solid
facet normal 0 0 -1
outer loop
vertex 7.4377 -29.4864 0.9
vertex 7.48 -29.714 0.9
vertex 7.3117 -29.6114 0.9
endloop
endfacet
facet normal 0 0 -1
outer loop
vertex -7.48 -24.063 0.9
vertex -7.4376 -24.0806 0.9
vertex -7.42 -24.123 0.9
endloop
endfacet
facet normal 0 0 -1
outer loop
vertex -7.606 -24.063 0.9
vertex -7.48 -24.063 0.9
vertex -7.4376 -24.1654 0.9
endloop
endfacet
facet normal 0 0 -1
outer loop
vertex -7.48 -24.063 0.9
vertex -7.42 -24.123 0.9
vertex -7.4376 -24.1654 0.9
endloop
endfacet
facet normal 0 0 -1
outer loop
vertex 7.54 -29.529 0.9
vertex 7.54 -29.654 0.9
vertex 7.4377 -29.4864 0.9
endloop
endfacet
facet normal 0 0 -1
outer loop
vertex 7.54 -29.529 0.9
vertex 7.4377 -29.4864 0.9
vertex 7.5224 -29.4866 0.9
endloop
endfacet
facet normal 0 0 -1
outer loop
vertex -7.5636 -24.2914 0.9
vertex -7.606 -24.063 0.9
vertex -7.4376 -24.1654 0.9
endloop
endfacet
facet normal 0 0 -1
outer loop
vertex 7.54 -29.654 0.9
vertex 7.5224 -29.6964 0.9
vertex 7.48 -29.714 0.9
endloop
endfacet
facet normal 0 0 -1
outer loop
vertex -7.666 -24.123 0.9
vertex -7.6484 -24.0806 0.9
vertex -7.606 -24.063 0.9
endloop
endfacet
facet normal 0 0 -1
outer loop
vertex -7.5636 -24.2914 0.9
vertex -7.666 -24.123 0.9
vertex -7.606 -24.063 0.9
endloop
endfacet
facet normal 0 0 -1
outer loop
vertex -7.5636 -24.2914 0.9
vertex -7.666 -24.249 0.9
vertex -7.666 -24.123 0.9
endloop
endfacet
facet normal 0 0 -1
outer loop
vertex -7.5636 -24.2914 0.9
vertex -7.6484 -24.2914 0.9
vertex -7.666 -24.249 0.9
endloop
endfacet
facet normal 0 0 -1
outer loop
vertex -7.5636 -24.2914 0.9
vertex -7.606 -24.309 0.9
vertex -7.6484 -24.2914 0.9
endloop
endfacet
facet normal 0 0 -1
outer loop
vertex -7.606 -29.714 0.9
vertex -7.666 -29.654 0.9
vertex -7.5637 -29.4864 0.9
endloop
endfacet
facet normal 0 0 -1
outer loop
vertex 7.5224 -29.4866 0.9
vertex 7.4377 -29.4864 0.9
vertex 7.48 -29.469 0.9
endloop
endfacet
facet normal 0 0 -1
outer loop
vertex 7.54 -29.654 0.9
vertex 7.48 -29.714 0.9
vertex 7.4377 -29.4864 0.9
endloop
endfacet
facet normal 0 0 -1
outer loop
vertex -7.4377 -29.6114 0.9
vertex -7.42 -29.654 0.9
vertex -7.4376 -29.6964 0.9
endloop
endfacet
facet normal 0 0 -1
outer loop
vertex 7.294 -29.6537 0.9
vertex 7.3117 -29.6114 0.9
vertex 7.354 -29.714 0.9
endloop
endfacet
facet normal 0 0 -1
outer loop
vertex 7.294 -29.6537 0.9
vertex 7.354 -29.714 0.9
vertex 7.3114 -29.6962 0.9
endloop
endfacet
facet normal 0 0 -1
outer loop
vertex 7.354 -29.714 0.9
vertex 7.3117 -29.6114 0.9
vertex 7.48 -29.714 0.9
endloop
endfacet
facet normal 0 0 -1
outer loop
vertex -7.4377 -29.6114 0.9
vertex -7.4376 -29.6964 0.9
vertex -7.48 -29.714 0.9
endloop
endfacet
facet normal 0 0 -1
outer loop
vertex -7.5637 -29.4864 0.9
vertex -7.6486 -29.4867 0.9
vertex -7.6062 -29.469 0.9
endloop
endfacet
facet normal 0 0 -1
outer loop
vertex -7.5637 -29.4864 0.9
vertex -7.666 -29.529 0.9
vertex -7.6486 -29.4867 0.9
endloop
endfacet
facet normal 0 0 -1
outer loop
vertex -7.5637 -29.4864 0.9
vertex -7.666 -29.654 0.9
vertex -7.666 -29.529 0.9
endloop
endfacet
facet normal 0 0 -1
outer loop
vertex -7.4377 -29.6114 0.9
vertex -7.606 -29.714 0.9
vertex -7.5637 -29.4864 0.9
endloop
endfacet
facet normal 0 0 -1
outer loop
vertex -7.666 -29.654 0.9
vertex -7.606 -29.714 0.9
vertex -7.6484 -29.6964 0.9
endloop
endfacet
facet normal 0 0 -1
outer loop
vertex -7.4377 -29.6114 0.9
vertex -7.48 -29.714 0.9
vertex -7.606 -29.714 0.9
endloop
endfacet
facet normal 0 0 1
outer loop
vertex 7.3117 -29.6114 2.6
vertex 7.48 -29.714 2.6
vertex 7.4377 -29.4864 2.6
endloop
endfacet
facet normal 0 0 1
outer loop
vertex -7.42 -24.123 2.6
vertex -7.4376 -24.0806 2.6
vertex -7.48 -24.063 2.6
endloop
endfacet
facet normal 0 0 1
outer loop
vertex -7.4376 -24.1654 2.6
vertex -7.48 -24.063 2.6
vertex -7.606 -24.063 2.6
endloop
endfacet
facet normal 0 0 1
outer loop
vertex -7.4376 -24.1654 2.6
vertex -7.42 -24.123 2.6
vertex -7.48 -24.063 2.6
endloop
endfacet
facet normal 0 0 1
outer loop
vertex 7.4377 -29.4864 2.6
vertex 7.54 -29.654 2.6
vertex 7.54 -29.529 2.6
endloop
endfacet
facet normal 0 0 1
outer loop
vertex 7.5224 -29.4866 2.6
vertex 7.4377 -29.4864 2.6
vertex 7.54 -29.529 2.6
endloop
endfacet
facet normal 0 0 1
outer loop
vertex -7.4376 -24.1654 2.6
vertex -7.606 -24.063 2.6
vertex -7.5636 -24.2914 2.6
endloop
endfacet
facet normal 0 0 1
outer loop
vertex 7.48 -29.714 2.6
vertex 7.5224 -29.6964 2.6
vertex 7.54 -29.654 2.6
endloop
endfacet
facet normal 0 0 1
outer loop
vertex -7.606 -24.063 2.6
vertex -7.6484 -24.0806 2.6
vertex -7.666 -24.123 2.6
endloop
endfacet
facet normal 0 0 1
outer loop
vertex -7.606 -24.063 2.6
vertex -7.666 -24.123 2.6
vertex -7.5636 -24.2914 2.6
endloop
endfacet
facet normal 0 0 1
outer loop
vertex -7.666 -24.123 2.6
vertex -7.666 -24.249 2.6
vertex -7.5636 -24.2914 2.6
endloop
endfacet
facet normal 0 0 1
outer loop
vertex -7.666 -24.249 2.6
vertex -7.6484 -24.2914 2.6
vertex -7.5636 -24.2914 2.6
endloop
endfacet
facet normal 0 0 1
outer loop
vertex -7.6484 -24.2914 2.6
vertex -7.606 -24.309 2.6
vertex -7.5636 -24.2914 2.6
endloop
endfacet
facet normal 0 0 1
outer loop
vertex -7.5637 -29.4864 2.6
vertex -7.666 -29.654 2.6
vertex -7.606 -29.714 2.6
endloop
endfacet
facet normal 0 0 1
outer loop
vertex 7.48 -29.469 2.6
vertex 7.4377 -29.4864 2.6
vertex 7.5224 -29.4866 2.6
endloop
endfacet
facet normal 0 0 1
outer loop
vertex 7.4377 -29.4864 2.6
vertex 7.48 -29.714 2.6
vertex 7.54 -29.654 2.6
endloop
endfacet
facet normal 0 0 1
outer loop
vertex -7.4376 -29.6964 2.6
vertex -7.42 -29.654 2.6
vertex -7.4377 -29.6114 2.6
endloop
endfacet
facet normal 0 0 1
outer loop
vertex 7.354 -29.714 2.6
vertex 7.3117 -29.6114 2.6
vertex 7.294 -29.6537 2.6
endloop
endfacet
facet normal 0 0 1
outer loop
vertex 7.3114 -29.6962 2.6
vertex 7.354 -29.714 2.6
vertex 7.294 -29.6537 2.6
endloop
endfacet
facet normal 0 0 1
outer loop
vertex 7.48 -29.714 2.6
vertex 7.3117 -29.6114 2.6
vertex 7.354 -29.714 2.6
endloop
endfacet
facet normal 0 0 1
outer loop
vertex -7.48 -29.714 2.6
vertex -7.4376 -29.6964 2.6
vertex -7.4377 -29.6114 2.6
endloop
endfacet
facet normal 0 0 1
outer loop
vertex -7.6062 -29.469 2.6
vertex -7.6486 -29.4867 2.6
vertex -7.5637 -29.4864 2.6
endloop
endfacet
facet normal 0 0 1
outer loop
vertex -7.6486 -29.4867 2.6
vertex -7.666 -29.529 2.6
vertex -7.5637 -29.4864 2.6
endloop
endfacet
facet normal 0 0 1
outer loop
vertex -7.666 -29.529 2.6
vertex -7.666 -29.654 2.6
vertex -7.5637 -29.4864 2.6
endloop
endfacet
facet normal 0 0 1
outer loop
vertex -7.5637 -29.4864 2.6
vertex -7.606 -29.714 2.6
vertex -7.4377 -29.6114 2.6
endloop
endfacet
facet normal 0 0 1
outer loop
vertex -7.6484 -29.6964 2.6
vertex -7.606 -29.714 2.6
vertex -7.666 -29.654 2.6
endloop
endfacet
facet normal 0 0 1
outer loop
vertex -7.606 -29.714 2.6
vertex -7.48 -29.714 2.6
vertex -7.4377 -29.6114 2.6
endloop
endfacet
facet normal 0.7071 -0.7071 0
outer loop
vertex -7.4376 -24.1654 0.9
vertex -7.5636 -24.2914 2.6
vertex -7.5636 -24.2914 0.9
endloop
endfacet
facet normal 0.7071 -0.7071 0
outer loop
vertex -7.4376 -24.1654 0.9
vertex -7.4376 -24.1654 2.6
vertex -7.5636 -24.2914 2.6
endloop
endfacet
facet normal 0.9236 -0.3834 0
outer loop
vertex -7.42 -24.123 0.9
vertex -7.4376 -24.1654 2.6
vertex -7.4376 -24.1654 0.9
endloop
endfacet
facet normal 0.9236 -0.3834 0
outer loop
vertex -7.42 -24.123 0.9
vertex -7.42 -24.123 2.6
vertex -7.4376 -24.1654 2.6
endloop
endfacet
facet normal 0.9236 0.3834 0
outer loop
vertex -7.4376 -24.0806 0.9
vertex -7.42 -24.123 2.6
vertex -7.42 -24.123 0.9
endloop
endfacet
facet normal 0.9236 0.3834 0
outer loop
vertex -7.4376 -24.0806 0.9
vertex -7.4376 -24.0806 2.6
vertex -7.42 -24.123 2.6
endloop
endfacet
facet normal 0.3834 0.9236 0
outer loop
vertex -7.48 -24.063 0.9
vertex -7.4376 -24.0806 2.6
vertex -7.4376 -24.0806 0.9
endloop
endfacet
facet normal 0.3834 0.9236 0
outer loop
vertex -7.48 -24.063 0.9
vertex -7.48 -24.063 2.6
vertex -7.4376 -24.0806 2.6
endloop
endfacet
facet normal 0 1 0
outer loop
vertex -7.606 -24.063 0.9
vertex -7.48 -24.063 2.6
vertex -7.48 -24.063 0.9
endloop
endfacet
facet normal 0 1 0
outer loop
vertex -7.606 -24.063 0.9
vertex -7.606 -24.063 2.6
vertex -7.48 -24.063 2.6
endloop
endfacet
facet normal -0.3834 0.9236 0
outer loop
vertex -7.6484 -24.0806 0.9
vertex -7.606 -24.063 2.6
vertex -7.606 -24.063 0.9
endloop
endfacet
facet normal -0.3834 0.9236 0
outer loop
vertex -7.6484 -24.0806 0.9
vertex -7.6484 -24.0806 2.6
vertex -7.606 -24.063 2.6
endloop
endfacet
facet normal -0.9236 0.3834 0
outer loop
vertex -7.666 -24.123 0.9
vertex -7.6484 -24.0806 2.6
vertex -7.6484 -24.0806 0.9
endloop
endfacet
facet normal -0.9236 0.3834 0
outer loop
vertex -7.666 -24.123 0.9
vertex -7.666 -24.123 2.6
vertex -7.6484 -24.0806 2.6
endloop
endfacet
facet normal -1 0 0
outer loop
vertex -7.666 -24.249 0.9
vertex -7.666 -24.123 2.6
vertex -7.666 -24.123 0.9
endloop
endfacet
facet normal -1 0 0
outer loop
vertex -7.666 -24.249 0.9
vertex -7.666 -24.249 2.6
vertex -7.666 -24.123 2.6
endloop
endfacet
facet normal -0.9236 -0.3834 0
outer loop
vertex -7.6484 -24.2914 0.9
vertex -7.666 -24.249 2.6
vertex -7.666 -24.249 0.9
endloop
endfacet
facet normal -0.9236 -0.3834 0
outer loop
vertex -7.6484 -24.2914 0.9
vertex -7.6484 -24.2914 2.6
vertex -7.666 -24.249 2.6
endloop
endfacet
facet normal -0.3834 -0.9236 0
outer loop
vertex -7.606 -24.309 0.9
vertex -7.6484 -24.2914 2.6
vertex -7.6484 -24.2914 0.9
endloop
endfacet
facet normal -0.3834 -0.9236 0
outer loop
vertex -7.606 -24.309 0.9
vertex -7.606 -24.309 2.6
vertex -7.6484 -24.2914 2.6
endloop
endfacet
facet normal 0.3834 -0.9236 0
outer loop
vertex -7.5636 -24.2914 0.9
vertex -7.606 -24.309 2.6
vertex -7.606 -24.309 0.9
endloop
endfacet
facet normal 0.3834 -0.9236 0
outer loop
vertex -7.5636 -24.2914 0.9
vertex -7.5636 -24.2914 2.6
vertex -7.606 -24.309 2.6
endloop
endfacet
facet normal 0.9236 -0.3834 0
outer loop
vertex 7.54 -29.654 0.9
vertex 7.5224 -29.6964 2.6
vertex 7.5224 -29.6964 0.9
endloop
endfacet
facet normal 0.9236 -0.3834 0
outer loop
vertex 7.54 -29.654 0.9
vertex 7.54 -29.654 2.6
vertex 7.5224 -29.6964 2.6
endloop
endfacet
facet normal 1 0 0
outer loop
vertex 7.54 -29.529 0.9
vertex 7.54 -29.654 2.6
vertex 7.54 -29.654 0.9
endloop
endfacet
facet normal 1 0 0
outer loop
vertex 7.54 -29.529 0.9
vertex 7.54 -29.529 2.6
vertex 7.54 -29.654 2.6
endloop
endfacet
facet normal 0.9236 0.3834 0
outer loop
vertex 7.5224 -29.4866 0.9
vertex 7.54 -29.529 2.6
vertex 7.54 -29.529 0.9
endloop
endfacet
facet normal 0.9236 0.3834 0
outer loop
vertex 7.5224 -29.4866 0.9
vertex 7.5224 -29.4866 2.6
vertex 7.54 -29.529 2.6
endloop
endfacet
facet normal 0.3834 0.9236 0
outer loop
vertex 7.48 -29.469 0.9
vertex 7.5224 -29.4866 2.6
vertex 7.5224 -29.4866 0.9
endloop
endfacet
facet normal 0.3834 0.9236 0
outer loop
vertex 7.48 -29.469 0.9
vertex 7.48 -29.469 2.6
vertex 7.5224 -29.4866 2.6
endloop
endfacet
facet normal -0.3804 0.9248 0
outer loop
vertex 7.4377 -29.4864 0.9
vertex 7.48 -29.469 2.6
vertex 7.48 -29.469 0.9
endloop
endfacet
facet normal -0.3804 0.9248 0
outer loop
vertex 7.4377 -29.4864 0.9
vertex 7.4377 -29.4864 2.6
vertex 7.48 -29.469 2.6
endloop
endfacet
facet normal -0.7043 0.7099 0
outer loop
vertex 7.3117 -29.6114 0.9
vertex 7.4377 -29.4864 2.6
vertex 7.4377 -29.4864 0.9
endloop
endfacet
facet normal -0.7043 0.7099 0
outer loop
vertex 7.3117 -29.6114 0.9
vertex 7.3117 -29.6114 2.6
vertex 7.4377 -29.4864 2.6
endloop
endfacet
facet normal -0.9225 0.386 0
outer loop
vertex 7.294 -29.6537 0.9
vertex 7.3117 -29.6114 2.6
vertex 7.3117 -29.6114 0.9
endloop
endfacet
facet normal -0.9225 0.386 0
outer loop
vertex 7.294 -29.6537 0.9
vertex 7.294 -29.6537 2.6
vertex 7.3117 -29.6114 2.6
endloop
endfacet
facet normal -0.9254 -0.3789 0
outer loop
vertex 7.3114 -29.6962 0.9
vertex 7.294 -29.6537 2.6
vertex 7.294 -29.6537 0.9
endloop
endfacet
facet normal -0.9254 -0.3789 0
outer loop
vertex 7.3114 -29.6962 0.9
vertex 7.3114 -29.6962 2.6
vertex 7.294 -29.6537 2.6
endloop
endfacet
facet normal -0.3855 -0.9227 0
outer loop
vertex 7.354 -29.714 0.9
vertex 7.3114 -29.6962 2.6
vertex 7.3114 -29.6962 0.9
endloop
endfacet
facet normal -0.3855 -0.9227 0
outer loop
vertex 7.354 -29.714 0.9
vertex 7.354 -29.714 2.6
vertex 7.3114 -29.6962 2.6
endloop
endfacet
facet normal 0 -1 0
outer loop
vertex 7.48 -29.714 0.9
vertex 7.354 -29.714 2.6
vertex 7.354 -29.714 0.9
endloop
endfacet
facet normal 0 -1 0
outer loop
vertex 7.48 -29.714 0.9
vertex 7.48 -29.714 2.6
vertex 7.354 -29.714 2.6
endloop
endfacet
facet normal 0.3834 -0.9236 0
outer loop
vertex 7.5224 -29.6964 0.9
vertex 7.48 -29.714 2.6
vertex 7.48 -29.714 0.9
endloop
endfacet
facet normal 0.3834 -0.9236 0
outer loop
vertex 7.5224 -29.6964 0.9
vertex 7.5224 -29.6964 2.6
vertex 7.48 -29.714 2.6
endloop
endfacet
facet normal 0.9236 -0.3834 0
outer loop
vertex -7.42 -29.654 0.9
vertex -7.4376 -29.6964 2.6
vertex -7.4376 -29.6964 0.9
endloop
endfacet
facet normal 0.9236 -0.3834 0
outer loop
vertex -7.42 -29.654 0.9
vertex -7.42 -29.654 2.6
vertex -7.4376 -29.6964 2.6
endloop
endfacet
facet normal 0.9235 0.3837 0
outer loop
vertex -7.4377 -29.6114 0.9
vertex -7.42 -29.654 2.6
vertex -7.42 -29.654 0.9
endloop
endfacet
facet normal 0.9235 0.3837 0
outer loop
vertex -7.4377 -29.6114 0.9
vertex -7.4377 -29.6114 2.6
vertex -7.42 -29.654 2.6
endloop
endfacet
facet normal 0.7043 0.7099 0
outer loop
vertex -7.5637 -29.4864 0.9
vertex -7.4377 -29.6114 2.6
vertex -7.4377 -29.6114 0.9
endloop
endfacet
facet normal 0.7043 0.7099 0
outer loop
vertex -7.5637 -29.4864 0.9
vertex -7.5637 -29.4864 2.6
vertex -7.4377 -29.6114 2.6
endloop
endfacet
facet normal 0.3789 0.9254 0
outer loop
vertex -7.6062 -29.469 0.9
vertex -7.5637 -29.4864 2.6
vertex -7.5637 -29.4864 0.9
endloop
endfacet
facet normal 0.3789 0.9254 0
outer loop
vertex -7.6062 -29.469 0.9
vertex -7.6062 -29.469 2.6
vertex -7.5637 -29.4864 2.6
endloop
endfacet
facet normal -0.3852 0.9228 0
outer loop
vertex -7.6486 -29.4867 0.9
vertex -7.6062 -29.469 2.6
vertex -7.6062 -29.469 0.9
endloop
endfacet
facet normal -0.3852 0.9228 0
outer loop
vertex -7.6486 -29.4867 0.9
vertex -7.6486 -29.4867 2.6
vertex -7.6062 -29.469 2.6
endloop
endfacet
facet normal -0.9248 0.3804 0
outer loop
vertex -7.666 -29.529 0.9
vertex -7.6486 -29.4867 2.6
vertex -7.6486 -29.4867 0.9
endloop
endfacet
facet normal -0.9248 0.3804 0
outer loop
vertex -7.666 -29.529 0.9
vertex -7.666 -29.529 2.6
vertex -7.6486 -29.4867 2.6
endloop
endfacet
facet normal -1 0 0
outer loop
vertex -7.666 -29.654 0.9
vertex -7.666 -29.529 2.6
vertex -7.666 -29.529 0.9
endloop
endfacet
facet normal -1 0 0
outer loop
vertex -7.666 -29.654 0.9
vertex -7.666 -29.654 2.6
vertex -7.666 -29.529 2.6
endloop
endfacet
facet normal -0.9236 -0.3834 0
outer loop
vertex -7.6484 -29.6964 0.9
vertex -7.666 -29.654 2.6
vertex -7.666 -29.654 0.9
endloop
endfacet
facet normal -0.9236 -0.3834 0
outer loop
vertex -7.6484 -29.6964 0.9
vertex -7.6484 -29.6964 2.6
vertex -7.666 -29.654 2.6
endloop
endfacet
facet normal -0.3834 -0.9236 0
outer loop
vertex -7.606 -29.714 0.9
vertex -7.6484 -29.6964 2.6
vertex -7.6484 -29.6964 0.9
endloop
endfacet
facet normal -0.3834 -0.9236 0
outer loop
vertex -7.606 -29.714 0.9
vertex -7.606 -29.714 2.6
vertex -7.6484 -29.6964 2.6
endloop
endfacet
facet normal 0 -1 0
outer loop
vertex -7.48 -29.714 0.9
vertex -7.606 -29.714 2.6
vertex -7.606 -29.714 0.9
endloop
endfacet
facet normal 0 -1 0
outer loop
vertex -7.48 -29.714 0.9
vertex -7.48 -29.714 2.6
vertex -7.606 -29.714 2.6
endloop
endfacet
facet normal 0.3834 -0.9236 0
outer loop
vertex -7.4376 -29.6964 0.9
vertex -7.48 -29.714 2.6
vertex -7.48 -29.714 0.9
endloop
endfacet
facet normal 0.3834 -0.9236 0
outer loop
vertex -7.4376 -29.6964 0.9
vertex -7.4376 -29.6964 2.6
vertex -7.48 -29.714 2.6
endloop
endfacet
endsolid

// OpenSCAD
$fn = 24;
translate([0, -2.500, 0.900])
  linear_extrude(height=1.700) {
offset(r=0.06, $fn=8) {
    polygon(points=[[4.840,-21.623],[4.714,-21.749],[4.714,-27.029],[4.840,-27.154],[7.480,-27.154],[7.480,-21.749],[7.354,-21.623],[4.840,-21.623],[7.354,-21.623],[7.480,-21.749],[7.480,-27.029],[7.354,-27.154],[4.840,-27.154],[4.714,-27.029],[4.714,-21.749]], paths=[[0,1,2,3,4,5,6],[7,8,9,10,11,12,13,14]]);
    polygon(points=[[-7.606,-21.623],[-7.606,-27.154],[-4.966,-27.154],[-4.840,-27.029],[-4.840,-21.749],[-4.966,-21.623],[-7.480,-21.623],[-4.966,-21.623],[-4.840,-21.749],[-4.840,-27.029],[-4.966,-27.154],[-7.480,-27.154],[-7.606,-27.029],[-7.606,-21.749]], paths=[[0,1,2,3,4,5],[6,7,8,9,10,11,12,13]]);
}
}
